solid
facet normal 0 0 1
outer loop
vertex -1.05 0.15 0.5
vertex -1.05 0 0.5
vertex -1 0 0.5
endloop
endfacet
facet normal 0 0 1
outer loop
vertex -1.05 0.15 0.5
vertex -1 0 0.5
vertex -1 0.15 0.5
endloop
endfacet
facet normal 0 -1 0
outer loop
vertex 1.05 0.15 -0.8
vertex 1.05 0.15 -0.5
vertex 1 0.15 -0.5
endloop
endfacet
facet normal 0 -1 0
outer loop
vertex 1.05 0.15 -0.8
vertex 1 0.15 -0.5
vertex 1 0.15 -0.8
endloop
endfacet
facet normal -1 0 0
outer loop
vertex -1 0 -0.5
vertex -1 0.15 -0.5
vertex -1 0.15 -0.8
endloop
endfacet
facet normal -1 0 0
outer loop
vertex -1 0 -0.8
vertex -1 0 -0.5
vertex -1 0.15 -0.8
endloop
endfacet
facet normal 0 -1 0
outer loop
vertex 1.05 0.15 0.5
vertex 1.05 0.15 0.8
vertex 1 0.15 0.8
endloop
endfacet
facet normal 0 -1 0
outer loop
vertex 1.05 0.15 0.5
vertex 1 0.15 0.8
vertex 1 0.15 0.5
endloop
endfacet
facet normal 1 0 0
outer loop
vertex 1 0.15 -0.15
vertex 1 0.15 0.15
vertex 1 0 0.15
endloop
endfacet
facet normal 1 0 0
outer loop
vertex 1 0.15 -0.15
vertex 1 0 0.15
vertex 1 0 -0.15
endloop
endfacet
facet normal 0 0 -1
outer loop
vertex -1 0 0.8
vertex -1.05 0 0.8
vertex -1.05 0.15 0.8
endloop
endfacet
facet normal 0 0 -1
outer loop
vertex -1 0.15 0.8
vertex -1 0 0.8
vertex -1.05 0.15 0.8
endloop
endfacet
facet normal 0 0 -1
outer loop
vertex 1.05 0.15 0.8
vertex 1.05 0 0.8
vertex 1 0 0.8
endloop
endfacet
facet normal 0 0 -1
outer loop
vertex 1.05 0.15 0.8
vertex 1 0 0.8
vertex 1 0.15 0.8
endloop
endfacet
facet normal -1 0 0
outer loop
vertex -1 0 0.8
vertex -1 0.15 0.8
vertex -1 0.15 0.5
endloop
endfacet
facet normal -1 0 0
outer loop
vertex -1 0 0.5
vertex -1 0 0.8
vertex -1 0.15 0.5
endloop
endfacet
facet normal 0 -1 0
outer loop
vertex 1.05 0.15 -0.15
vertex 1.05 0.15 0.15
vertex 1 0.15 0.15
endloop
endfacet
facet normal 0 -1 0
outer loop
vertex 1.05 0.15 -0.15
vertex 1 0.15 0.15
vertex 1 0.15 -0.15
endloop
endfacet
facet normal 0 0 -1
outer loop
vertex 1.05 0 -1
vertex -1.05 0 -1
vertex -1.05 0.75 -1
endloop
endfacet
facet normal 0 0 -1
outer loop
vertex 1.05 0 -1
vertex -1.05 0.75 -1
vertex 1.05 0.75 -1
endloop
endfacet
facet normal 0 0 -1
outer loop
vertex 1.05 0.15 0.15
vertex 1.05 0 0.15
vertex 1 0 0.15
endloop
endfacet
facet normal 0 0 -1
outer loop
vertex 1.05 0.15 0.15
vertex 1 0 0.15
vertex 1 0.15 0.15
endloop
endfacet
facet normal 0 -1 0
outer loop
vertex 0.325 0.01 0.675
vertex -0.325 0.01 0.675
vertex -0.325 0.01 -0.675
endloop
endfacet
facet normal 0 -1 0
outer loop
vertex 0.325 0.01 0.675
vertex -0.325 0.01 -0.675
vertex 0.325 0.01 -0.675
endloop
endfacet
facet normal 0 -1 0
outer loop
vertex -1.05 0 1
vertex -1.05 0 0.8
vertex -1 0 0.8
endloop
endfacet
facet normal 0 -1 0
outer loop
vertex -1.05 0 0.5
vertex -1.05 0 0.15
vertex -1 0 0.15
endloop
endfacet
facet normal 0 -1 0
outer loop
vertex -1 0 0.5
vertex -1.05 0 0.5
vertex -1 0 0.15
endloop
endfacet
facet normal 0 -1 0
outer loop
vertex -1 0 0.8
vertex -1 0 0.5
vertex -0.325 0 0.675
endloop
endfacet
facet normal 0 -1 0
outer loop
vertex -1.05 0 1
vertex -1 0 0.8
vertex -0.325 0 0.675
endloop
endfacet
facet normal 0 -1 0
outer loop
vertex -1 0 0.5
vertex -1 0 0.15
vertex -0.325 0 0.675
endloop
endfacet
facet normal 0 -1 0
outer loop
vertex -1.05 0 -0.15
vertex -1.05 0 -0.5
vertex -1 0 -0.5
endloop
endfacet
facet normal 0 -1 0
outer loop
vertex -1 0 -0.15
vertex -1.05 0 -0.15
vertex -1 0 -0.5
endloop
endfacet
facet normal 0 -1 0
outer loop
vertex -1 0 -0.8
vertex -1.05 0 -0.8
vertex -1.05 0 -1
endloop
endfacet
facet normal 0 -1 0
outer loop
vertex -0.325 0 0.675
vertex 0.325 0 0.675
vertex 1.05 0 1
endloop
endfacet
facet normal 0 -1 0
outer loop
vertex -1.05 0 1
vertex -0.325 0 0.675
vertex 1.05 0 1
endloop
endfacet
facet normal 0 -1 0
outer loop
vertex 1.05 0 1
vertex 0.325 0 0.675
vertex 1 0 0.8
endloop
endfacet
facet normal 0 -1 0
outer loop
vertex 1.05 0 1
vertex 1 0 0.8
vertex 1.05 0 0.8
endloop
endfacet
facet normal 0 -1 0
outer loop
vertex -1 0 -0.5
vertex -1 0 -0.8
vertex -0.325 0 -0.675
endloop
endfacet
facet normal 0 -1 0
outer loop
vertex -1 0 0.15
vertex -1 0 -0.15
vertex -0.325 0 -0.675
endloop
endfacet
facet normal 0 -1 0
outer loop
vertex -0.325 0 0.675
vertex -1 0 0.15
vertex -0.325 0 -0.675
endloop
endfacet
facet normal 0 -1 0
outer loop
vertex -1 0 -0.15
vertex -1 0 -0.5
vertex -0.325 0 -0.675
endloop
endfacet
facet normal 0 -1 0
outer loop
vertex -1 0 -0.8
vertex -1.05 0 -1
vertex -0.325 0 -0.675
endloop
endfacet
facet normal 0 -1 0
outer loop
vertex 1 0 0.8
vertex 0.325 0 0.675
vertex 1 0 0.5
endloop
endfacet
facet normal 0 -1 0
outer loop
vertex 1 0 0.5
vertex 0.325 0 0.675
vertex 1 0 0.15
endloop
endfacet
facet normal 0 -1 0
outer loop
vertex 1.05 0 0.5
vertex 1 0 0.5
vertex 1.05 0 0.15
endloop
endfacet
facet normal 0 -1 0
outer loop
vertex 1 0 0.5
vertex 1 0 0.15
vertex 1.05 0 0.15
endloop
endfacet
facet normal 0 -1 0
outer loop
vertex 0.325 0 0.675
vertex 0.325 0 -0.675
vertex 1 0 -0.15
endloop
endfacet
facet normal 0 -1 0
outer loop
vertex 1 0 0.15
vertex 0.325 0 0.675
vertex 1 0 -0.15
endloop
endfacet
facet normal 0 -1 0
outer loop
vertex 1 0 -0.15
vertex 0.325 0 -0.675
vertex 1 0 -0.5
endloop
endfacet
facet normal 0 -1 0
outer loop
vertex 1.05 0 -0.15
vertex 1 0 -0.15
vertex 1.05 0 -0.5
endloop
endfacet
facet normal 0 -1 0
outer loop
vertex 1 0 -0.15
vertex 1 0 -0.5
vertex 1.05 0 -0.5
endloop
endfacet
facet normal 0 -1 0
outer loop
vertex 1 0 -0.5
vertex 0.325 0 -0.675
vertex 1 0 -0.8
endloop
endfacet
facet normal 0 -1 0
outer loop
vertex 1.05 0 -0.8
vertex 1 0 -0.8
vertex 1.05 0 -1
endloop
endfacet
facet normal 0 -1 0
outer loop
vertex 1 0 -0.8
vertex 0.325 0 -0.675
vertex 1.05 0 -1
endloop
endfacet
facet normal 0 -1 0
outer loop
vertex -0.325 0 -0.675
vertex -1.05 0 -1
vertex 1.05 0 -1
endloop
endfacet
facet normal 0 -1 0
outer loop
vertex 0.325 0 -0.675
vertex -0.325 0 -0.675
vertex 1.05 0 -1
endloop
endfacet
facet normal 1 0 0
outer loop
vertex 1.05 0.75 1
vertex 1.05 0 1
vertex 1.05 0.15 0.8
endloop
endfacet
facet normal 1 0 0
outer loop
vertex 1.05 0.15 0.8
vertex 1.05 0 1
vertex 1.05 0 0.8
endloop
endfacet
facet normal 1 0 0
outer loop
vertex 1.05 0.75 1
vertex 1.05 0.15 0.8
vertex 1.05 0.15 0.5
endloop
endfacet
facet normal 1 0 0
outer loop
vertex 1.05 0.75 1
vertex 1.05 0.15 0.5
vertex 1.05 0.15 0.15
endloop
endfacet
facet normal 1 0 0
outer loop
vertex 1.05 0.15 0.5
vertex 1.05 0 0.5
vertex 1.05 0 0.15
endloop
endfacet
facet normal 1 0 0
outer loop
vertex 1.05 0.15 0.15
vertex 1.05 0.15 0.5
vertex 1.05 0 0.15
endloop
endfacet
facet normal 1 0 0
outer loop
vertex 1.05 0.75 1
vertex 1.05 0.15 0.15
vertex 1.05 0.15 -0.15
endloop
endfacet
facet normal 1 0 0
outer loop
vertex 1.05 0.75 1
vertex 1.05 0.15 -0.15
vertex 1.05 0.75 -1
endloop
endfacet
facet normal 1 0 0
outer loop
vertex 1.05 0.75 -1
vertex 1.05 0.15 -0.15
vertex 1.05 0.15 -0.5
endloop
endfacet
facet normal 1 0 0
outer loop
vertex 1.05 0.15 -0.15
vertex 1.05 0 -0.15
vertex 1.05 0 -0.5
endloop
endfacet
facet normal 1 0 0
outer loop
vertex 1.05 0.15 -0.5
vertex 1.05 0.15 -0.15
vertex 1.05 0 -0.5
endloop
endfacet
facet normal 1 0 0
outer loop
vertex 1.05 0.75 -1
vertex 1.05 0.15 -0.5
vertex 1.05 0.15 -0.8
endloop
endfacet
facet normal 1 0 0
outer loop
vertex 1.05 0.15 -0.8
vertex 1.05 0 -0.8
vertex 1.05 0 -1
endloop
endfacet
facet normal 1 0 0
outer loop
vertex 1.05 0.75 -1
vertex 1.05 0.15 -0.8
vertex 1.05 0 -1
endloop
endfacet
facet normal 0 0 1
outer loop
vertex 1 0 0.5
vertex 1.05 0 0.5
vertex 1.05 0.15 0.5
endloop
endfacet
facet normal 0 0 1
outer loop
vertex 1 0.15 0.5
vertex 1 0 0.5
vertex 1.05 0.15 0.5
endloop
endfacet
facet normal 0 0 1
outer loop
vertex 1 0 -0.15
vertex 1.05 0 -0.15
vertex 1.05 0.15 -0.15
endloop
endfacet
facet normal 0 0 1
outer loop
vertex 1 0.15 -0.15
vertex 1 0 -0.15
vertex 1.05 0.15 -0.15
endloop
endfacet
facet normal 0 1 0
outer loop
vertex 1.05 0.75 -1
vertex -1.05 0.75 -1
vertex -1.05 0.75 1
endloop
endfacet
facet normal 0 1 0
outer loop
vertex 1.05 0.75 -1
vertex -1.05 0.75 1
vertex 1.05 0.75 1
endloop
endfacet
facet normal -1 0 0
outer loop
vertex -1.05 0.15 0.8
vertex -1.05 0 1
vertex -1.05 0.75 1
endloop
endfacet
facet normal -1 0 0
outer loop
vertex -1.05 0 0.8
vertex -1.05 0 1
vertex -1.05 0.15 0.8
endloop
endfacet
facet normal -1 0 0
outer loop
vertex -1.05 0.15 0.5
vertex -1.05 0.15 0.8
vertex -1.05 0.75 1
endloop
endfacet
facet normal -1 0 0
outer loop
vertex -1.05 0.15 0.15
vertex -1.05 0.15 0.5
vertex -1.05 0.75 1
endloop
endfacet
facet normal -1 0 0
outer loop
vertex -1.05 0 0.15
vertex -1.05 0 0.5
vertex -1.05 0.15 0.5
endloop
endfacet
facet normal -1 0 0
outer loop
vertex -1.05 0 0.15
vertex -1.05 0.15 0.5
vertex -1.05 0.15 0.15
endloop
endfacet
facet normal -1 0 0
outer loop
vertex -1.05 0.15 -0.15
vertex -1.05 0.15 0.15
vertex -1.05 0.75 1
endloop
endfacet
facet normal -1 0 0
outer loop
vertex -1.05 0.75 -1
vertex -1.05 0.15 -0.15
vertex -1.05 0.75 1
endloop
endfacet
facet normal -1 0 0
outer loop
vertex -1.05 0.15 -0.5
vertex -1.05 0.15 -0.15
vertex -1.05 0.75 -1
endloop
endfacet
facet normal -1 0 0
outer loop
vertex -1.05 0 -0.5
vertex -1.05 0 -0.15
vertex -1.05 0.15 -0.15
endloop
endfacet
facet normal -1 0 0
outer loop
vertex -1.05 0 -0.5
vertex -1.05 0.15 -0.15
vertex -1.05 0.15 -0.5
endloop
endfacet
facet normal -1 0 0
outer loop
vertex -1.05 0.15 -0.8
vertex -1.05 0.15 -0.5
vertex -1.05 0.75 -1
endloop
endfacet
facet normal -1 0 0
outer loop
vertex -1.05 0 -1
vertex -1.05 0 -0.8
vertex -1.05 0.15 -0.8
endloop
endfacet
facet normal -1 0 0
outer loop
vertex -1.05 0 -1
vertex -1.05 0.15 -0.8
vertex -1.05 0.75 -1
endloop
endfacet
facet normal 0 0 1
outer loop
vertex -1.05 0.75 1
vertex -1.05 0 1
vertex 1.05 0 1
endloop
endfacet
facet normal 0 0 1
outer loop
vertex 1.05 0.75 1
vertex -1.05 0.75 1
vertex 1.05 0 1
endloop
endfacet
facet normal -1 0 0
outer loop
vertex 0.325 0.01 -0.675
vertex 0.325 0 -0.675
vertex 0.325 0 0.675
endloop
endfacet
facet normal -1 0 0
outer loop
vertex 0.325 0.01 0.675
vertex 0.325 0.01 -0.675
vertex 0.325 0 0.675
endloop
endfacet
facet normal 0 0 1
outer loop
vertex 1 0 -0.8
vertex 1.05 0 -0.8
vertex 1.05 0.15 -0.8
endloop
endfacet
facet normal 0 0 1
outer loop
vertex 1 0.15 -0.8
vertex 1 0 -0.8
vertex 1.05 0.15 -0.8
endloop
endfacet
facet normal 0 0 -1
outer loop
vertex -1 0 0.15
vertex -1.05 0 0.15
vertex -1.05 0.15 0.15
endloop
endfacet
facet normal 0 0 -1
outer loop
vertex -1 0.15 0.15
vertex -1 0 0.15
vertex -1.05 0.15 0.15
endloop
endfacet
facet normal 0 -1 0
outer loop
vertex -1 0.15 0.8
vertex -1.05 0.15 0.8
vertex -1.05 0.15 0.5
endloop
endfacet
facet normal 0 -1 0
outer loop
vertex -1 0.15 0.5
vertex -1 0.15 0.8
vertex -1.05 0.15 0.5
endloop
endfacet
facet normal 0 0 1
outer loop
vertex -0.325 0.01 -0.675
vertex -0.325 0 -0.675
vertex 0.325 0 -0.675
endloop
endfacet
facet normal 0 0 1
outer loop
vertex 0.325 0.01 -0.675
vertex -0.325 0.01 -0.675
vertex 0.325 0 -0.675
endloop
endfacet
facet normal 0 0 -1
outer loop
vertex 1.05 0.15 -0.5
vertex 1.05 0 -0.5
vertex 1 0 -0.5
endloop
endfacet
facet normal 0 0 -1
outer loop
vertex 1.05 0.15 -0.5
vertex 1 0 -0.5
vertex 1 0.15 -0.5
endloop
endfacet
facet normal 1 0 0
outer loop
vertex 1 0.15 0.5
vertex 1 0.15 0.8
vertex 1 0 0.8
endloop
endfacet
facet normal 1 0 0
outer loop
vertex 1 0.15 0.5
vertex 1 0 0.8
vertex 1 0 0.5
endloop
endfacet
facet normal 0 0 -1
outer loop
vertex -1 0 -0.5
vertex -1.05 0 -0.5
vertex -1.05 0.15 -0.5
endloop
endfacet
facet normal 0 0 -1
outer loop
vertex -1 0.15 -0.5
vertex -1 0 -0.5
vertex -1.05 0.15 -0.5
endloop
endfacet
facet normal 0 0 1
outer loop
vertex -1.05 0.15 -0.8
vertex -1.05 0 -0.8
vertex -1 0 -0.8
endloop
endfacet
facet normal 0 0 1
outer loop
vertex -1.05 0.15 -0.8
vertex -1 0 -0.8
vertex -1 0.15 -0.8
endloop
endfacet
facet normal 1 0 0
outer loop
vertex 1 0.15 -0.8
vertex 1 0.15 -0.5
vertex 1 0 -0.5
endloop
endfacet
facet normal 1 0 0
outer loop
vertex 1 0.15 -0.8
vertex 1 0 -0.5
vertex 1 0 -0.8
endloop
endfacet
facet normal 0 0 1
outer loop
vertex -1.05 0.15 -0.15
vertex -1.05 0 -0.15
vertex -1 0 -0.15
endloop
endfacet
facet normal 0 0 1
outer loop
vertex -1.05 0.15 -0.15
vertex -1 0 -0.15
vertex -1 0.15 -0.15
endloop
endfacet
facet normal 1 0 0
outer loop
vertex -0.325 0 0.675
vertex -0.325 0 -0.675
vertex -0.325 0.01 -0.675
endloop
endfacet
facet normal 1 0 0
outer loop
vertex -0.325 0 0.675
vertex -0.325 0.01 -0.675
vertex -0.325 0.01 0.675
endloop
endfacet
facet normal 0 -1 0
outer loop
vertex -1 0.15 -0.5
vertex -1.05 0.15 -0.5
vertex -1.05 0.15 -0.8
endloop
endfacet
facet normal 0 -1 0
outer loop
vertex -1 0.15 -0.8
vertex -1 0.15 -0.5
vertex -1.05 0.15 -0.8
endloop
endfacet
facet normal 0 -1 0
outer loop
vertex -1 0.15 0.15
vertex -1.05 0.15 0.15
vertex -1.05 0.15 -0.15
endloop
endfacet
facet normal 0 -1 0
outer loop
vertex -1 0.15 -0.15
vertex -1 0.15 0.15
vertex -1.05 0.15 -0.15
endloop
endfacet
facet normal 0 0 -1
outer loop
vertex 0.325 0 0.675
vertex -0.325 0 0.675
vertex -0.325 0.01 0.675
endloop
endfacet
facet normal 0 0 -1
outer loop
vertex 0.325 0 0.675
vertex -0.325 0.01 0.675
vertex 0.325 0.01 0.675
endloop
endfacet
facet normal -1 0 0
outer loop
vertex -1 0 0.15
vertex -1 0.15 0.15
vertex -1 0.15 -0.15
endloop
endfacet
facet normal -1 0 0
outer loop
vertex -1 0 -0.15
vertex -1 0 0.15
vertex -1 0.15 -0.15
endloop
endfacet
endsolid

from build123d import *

# Parameters (mm, degrees)
SKETCH1_W           = 2.1
SKETCH1_H           = 2
BOSS_EXTRUDE1_DEPTH = 0.75
SKETCH2_W           = 0.3
SKETCH2_H           = 0.2
CUT_EXTRUDE1_DEPTH  = 0.05
SKETCH3_W           = 0.65
SKETCH3_H           = 1.35
CUT_EXTRUDE2_DEPTH  = 0.01


with BuildPart() as part:
    # Sketch1 → Boss-Extrude1 (new body)
    with BuildSketch(Plane(origin=(0, 0, 0), x_dir=(1, 0, 0), z_dir=(0, 1, 0))):
        Rectangle(SKETCH1_W, SKETCH1_H)
    extrude(amount=BOSS_EXTRUDE1_DEPTH)

    # Sketch2 → Cut-Extrude1 (cut)
    with BuildSketch(Plane(origin=(1.05, 0, 0), x_dir=(0, 0, -1), z_dir=(1, 0, 0))):
        with Locations((-0.65, 0.05)):
            Rectangle(SKETCH2_W, SKETCH2_H)
        with Locations((0, 0.05)):
            Rectangle(SKETCH2_W, SKETCH2_H)
        with Locations((0.65, 0.05)):
            Rectangle(SKETCH2_W, SKETCH2_H)
    cut_extrude1 = extrude(amount=-CUT_EXTRUDE1_DEPTH, mode=Mode.SUBTRACT)

    # Mirror1: Cut-Extrude1 across plane
    add(cut_extrude1.mirror(Plane(origin=(0, 0, 0), x_dir=(0, 0, 1), z_dir=(1, 0, 0))), mode=Mode.SUBTRACT)

    # Sketch3 → Cut-Extrude2 (cut)
    with BuildSketch(Plane.XZ):
        Rectangle(SKETCH3_W, SKETCH3_H)
    extrude(amount=-CUT_EXTRUDE2_DEPTH, mode=Mode.SUBTRACT)


solid = part.part
